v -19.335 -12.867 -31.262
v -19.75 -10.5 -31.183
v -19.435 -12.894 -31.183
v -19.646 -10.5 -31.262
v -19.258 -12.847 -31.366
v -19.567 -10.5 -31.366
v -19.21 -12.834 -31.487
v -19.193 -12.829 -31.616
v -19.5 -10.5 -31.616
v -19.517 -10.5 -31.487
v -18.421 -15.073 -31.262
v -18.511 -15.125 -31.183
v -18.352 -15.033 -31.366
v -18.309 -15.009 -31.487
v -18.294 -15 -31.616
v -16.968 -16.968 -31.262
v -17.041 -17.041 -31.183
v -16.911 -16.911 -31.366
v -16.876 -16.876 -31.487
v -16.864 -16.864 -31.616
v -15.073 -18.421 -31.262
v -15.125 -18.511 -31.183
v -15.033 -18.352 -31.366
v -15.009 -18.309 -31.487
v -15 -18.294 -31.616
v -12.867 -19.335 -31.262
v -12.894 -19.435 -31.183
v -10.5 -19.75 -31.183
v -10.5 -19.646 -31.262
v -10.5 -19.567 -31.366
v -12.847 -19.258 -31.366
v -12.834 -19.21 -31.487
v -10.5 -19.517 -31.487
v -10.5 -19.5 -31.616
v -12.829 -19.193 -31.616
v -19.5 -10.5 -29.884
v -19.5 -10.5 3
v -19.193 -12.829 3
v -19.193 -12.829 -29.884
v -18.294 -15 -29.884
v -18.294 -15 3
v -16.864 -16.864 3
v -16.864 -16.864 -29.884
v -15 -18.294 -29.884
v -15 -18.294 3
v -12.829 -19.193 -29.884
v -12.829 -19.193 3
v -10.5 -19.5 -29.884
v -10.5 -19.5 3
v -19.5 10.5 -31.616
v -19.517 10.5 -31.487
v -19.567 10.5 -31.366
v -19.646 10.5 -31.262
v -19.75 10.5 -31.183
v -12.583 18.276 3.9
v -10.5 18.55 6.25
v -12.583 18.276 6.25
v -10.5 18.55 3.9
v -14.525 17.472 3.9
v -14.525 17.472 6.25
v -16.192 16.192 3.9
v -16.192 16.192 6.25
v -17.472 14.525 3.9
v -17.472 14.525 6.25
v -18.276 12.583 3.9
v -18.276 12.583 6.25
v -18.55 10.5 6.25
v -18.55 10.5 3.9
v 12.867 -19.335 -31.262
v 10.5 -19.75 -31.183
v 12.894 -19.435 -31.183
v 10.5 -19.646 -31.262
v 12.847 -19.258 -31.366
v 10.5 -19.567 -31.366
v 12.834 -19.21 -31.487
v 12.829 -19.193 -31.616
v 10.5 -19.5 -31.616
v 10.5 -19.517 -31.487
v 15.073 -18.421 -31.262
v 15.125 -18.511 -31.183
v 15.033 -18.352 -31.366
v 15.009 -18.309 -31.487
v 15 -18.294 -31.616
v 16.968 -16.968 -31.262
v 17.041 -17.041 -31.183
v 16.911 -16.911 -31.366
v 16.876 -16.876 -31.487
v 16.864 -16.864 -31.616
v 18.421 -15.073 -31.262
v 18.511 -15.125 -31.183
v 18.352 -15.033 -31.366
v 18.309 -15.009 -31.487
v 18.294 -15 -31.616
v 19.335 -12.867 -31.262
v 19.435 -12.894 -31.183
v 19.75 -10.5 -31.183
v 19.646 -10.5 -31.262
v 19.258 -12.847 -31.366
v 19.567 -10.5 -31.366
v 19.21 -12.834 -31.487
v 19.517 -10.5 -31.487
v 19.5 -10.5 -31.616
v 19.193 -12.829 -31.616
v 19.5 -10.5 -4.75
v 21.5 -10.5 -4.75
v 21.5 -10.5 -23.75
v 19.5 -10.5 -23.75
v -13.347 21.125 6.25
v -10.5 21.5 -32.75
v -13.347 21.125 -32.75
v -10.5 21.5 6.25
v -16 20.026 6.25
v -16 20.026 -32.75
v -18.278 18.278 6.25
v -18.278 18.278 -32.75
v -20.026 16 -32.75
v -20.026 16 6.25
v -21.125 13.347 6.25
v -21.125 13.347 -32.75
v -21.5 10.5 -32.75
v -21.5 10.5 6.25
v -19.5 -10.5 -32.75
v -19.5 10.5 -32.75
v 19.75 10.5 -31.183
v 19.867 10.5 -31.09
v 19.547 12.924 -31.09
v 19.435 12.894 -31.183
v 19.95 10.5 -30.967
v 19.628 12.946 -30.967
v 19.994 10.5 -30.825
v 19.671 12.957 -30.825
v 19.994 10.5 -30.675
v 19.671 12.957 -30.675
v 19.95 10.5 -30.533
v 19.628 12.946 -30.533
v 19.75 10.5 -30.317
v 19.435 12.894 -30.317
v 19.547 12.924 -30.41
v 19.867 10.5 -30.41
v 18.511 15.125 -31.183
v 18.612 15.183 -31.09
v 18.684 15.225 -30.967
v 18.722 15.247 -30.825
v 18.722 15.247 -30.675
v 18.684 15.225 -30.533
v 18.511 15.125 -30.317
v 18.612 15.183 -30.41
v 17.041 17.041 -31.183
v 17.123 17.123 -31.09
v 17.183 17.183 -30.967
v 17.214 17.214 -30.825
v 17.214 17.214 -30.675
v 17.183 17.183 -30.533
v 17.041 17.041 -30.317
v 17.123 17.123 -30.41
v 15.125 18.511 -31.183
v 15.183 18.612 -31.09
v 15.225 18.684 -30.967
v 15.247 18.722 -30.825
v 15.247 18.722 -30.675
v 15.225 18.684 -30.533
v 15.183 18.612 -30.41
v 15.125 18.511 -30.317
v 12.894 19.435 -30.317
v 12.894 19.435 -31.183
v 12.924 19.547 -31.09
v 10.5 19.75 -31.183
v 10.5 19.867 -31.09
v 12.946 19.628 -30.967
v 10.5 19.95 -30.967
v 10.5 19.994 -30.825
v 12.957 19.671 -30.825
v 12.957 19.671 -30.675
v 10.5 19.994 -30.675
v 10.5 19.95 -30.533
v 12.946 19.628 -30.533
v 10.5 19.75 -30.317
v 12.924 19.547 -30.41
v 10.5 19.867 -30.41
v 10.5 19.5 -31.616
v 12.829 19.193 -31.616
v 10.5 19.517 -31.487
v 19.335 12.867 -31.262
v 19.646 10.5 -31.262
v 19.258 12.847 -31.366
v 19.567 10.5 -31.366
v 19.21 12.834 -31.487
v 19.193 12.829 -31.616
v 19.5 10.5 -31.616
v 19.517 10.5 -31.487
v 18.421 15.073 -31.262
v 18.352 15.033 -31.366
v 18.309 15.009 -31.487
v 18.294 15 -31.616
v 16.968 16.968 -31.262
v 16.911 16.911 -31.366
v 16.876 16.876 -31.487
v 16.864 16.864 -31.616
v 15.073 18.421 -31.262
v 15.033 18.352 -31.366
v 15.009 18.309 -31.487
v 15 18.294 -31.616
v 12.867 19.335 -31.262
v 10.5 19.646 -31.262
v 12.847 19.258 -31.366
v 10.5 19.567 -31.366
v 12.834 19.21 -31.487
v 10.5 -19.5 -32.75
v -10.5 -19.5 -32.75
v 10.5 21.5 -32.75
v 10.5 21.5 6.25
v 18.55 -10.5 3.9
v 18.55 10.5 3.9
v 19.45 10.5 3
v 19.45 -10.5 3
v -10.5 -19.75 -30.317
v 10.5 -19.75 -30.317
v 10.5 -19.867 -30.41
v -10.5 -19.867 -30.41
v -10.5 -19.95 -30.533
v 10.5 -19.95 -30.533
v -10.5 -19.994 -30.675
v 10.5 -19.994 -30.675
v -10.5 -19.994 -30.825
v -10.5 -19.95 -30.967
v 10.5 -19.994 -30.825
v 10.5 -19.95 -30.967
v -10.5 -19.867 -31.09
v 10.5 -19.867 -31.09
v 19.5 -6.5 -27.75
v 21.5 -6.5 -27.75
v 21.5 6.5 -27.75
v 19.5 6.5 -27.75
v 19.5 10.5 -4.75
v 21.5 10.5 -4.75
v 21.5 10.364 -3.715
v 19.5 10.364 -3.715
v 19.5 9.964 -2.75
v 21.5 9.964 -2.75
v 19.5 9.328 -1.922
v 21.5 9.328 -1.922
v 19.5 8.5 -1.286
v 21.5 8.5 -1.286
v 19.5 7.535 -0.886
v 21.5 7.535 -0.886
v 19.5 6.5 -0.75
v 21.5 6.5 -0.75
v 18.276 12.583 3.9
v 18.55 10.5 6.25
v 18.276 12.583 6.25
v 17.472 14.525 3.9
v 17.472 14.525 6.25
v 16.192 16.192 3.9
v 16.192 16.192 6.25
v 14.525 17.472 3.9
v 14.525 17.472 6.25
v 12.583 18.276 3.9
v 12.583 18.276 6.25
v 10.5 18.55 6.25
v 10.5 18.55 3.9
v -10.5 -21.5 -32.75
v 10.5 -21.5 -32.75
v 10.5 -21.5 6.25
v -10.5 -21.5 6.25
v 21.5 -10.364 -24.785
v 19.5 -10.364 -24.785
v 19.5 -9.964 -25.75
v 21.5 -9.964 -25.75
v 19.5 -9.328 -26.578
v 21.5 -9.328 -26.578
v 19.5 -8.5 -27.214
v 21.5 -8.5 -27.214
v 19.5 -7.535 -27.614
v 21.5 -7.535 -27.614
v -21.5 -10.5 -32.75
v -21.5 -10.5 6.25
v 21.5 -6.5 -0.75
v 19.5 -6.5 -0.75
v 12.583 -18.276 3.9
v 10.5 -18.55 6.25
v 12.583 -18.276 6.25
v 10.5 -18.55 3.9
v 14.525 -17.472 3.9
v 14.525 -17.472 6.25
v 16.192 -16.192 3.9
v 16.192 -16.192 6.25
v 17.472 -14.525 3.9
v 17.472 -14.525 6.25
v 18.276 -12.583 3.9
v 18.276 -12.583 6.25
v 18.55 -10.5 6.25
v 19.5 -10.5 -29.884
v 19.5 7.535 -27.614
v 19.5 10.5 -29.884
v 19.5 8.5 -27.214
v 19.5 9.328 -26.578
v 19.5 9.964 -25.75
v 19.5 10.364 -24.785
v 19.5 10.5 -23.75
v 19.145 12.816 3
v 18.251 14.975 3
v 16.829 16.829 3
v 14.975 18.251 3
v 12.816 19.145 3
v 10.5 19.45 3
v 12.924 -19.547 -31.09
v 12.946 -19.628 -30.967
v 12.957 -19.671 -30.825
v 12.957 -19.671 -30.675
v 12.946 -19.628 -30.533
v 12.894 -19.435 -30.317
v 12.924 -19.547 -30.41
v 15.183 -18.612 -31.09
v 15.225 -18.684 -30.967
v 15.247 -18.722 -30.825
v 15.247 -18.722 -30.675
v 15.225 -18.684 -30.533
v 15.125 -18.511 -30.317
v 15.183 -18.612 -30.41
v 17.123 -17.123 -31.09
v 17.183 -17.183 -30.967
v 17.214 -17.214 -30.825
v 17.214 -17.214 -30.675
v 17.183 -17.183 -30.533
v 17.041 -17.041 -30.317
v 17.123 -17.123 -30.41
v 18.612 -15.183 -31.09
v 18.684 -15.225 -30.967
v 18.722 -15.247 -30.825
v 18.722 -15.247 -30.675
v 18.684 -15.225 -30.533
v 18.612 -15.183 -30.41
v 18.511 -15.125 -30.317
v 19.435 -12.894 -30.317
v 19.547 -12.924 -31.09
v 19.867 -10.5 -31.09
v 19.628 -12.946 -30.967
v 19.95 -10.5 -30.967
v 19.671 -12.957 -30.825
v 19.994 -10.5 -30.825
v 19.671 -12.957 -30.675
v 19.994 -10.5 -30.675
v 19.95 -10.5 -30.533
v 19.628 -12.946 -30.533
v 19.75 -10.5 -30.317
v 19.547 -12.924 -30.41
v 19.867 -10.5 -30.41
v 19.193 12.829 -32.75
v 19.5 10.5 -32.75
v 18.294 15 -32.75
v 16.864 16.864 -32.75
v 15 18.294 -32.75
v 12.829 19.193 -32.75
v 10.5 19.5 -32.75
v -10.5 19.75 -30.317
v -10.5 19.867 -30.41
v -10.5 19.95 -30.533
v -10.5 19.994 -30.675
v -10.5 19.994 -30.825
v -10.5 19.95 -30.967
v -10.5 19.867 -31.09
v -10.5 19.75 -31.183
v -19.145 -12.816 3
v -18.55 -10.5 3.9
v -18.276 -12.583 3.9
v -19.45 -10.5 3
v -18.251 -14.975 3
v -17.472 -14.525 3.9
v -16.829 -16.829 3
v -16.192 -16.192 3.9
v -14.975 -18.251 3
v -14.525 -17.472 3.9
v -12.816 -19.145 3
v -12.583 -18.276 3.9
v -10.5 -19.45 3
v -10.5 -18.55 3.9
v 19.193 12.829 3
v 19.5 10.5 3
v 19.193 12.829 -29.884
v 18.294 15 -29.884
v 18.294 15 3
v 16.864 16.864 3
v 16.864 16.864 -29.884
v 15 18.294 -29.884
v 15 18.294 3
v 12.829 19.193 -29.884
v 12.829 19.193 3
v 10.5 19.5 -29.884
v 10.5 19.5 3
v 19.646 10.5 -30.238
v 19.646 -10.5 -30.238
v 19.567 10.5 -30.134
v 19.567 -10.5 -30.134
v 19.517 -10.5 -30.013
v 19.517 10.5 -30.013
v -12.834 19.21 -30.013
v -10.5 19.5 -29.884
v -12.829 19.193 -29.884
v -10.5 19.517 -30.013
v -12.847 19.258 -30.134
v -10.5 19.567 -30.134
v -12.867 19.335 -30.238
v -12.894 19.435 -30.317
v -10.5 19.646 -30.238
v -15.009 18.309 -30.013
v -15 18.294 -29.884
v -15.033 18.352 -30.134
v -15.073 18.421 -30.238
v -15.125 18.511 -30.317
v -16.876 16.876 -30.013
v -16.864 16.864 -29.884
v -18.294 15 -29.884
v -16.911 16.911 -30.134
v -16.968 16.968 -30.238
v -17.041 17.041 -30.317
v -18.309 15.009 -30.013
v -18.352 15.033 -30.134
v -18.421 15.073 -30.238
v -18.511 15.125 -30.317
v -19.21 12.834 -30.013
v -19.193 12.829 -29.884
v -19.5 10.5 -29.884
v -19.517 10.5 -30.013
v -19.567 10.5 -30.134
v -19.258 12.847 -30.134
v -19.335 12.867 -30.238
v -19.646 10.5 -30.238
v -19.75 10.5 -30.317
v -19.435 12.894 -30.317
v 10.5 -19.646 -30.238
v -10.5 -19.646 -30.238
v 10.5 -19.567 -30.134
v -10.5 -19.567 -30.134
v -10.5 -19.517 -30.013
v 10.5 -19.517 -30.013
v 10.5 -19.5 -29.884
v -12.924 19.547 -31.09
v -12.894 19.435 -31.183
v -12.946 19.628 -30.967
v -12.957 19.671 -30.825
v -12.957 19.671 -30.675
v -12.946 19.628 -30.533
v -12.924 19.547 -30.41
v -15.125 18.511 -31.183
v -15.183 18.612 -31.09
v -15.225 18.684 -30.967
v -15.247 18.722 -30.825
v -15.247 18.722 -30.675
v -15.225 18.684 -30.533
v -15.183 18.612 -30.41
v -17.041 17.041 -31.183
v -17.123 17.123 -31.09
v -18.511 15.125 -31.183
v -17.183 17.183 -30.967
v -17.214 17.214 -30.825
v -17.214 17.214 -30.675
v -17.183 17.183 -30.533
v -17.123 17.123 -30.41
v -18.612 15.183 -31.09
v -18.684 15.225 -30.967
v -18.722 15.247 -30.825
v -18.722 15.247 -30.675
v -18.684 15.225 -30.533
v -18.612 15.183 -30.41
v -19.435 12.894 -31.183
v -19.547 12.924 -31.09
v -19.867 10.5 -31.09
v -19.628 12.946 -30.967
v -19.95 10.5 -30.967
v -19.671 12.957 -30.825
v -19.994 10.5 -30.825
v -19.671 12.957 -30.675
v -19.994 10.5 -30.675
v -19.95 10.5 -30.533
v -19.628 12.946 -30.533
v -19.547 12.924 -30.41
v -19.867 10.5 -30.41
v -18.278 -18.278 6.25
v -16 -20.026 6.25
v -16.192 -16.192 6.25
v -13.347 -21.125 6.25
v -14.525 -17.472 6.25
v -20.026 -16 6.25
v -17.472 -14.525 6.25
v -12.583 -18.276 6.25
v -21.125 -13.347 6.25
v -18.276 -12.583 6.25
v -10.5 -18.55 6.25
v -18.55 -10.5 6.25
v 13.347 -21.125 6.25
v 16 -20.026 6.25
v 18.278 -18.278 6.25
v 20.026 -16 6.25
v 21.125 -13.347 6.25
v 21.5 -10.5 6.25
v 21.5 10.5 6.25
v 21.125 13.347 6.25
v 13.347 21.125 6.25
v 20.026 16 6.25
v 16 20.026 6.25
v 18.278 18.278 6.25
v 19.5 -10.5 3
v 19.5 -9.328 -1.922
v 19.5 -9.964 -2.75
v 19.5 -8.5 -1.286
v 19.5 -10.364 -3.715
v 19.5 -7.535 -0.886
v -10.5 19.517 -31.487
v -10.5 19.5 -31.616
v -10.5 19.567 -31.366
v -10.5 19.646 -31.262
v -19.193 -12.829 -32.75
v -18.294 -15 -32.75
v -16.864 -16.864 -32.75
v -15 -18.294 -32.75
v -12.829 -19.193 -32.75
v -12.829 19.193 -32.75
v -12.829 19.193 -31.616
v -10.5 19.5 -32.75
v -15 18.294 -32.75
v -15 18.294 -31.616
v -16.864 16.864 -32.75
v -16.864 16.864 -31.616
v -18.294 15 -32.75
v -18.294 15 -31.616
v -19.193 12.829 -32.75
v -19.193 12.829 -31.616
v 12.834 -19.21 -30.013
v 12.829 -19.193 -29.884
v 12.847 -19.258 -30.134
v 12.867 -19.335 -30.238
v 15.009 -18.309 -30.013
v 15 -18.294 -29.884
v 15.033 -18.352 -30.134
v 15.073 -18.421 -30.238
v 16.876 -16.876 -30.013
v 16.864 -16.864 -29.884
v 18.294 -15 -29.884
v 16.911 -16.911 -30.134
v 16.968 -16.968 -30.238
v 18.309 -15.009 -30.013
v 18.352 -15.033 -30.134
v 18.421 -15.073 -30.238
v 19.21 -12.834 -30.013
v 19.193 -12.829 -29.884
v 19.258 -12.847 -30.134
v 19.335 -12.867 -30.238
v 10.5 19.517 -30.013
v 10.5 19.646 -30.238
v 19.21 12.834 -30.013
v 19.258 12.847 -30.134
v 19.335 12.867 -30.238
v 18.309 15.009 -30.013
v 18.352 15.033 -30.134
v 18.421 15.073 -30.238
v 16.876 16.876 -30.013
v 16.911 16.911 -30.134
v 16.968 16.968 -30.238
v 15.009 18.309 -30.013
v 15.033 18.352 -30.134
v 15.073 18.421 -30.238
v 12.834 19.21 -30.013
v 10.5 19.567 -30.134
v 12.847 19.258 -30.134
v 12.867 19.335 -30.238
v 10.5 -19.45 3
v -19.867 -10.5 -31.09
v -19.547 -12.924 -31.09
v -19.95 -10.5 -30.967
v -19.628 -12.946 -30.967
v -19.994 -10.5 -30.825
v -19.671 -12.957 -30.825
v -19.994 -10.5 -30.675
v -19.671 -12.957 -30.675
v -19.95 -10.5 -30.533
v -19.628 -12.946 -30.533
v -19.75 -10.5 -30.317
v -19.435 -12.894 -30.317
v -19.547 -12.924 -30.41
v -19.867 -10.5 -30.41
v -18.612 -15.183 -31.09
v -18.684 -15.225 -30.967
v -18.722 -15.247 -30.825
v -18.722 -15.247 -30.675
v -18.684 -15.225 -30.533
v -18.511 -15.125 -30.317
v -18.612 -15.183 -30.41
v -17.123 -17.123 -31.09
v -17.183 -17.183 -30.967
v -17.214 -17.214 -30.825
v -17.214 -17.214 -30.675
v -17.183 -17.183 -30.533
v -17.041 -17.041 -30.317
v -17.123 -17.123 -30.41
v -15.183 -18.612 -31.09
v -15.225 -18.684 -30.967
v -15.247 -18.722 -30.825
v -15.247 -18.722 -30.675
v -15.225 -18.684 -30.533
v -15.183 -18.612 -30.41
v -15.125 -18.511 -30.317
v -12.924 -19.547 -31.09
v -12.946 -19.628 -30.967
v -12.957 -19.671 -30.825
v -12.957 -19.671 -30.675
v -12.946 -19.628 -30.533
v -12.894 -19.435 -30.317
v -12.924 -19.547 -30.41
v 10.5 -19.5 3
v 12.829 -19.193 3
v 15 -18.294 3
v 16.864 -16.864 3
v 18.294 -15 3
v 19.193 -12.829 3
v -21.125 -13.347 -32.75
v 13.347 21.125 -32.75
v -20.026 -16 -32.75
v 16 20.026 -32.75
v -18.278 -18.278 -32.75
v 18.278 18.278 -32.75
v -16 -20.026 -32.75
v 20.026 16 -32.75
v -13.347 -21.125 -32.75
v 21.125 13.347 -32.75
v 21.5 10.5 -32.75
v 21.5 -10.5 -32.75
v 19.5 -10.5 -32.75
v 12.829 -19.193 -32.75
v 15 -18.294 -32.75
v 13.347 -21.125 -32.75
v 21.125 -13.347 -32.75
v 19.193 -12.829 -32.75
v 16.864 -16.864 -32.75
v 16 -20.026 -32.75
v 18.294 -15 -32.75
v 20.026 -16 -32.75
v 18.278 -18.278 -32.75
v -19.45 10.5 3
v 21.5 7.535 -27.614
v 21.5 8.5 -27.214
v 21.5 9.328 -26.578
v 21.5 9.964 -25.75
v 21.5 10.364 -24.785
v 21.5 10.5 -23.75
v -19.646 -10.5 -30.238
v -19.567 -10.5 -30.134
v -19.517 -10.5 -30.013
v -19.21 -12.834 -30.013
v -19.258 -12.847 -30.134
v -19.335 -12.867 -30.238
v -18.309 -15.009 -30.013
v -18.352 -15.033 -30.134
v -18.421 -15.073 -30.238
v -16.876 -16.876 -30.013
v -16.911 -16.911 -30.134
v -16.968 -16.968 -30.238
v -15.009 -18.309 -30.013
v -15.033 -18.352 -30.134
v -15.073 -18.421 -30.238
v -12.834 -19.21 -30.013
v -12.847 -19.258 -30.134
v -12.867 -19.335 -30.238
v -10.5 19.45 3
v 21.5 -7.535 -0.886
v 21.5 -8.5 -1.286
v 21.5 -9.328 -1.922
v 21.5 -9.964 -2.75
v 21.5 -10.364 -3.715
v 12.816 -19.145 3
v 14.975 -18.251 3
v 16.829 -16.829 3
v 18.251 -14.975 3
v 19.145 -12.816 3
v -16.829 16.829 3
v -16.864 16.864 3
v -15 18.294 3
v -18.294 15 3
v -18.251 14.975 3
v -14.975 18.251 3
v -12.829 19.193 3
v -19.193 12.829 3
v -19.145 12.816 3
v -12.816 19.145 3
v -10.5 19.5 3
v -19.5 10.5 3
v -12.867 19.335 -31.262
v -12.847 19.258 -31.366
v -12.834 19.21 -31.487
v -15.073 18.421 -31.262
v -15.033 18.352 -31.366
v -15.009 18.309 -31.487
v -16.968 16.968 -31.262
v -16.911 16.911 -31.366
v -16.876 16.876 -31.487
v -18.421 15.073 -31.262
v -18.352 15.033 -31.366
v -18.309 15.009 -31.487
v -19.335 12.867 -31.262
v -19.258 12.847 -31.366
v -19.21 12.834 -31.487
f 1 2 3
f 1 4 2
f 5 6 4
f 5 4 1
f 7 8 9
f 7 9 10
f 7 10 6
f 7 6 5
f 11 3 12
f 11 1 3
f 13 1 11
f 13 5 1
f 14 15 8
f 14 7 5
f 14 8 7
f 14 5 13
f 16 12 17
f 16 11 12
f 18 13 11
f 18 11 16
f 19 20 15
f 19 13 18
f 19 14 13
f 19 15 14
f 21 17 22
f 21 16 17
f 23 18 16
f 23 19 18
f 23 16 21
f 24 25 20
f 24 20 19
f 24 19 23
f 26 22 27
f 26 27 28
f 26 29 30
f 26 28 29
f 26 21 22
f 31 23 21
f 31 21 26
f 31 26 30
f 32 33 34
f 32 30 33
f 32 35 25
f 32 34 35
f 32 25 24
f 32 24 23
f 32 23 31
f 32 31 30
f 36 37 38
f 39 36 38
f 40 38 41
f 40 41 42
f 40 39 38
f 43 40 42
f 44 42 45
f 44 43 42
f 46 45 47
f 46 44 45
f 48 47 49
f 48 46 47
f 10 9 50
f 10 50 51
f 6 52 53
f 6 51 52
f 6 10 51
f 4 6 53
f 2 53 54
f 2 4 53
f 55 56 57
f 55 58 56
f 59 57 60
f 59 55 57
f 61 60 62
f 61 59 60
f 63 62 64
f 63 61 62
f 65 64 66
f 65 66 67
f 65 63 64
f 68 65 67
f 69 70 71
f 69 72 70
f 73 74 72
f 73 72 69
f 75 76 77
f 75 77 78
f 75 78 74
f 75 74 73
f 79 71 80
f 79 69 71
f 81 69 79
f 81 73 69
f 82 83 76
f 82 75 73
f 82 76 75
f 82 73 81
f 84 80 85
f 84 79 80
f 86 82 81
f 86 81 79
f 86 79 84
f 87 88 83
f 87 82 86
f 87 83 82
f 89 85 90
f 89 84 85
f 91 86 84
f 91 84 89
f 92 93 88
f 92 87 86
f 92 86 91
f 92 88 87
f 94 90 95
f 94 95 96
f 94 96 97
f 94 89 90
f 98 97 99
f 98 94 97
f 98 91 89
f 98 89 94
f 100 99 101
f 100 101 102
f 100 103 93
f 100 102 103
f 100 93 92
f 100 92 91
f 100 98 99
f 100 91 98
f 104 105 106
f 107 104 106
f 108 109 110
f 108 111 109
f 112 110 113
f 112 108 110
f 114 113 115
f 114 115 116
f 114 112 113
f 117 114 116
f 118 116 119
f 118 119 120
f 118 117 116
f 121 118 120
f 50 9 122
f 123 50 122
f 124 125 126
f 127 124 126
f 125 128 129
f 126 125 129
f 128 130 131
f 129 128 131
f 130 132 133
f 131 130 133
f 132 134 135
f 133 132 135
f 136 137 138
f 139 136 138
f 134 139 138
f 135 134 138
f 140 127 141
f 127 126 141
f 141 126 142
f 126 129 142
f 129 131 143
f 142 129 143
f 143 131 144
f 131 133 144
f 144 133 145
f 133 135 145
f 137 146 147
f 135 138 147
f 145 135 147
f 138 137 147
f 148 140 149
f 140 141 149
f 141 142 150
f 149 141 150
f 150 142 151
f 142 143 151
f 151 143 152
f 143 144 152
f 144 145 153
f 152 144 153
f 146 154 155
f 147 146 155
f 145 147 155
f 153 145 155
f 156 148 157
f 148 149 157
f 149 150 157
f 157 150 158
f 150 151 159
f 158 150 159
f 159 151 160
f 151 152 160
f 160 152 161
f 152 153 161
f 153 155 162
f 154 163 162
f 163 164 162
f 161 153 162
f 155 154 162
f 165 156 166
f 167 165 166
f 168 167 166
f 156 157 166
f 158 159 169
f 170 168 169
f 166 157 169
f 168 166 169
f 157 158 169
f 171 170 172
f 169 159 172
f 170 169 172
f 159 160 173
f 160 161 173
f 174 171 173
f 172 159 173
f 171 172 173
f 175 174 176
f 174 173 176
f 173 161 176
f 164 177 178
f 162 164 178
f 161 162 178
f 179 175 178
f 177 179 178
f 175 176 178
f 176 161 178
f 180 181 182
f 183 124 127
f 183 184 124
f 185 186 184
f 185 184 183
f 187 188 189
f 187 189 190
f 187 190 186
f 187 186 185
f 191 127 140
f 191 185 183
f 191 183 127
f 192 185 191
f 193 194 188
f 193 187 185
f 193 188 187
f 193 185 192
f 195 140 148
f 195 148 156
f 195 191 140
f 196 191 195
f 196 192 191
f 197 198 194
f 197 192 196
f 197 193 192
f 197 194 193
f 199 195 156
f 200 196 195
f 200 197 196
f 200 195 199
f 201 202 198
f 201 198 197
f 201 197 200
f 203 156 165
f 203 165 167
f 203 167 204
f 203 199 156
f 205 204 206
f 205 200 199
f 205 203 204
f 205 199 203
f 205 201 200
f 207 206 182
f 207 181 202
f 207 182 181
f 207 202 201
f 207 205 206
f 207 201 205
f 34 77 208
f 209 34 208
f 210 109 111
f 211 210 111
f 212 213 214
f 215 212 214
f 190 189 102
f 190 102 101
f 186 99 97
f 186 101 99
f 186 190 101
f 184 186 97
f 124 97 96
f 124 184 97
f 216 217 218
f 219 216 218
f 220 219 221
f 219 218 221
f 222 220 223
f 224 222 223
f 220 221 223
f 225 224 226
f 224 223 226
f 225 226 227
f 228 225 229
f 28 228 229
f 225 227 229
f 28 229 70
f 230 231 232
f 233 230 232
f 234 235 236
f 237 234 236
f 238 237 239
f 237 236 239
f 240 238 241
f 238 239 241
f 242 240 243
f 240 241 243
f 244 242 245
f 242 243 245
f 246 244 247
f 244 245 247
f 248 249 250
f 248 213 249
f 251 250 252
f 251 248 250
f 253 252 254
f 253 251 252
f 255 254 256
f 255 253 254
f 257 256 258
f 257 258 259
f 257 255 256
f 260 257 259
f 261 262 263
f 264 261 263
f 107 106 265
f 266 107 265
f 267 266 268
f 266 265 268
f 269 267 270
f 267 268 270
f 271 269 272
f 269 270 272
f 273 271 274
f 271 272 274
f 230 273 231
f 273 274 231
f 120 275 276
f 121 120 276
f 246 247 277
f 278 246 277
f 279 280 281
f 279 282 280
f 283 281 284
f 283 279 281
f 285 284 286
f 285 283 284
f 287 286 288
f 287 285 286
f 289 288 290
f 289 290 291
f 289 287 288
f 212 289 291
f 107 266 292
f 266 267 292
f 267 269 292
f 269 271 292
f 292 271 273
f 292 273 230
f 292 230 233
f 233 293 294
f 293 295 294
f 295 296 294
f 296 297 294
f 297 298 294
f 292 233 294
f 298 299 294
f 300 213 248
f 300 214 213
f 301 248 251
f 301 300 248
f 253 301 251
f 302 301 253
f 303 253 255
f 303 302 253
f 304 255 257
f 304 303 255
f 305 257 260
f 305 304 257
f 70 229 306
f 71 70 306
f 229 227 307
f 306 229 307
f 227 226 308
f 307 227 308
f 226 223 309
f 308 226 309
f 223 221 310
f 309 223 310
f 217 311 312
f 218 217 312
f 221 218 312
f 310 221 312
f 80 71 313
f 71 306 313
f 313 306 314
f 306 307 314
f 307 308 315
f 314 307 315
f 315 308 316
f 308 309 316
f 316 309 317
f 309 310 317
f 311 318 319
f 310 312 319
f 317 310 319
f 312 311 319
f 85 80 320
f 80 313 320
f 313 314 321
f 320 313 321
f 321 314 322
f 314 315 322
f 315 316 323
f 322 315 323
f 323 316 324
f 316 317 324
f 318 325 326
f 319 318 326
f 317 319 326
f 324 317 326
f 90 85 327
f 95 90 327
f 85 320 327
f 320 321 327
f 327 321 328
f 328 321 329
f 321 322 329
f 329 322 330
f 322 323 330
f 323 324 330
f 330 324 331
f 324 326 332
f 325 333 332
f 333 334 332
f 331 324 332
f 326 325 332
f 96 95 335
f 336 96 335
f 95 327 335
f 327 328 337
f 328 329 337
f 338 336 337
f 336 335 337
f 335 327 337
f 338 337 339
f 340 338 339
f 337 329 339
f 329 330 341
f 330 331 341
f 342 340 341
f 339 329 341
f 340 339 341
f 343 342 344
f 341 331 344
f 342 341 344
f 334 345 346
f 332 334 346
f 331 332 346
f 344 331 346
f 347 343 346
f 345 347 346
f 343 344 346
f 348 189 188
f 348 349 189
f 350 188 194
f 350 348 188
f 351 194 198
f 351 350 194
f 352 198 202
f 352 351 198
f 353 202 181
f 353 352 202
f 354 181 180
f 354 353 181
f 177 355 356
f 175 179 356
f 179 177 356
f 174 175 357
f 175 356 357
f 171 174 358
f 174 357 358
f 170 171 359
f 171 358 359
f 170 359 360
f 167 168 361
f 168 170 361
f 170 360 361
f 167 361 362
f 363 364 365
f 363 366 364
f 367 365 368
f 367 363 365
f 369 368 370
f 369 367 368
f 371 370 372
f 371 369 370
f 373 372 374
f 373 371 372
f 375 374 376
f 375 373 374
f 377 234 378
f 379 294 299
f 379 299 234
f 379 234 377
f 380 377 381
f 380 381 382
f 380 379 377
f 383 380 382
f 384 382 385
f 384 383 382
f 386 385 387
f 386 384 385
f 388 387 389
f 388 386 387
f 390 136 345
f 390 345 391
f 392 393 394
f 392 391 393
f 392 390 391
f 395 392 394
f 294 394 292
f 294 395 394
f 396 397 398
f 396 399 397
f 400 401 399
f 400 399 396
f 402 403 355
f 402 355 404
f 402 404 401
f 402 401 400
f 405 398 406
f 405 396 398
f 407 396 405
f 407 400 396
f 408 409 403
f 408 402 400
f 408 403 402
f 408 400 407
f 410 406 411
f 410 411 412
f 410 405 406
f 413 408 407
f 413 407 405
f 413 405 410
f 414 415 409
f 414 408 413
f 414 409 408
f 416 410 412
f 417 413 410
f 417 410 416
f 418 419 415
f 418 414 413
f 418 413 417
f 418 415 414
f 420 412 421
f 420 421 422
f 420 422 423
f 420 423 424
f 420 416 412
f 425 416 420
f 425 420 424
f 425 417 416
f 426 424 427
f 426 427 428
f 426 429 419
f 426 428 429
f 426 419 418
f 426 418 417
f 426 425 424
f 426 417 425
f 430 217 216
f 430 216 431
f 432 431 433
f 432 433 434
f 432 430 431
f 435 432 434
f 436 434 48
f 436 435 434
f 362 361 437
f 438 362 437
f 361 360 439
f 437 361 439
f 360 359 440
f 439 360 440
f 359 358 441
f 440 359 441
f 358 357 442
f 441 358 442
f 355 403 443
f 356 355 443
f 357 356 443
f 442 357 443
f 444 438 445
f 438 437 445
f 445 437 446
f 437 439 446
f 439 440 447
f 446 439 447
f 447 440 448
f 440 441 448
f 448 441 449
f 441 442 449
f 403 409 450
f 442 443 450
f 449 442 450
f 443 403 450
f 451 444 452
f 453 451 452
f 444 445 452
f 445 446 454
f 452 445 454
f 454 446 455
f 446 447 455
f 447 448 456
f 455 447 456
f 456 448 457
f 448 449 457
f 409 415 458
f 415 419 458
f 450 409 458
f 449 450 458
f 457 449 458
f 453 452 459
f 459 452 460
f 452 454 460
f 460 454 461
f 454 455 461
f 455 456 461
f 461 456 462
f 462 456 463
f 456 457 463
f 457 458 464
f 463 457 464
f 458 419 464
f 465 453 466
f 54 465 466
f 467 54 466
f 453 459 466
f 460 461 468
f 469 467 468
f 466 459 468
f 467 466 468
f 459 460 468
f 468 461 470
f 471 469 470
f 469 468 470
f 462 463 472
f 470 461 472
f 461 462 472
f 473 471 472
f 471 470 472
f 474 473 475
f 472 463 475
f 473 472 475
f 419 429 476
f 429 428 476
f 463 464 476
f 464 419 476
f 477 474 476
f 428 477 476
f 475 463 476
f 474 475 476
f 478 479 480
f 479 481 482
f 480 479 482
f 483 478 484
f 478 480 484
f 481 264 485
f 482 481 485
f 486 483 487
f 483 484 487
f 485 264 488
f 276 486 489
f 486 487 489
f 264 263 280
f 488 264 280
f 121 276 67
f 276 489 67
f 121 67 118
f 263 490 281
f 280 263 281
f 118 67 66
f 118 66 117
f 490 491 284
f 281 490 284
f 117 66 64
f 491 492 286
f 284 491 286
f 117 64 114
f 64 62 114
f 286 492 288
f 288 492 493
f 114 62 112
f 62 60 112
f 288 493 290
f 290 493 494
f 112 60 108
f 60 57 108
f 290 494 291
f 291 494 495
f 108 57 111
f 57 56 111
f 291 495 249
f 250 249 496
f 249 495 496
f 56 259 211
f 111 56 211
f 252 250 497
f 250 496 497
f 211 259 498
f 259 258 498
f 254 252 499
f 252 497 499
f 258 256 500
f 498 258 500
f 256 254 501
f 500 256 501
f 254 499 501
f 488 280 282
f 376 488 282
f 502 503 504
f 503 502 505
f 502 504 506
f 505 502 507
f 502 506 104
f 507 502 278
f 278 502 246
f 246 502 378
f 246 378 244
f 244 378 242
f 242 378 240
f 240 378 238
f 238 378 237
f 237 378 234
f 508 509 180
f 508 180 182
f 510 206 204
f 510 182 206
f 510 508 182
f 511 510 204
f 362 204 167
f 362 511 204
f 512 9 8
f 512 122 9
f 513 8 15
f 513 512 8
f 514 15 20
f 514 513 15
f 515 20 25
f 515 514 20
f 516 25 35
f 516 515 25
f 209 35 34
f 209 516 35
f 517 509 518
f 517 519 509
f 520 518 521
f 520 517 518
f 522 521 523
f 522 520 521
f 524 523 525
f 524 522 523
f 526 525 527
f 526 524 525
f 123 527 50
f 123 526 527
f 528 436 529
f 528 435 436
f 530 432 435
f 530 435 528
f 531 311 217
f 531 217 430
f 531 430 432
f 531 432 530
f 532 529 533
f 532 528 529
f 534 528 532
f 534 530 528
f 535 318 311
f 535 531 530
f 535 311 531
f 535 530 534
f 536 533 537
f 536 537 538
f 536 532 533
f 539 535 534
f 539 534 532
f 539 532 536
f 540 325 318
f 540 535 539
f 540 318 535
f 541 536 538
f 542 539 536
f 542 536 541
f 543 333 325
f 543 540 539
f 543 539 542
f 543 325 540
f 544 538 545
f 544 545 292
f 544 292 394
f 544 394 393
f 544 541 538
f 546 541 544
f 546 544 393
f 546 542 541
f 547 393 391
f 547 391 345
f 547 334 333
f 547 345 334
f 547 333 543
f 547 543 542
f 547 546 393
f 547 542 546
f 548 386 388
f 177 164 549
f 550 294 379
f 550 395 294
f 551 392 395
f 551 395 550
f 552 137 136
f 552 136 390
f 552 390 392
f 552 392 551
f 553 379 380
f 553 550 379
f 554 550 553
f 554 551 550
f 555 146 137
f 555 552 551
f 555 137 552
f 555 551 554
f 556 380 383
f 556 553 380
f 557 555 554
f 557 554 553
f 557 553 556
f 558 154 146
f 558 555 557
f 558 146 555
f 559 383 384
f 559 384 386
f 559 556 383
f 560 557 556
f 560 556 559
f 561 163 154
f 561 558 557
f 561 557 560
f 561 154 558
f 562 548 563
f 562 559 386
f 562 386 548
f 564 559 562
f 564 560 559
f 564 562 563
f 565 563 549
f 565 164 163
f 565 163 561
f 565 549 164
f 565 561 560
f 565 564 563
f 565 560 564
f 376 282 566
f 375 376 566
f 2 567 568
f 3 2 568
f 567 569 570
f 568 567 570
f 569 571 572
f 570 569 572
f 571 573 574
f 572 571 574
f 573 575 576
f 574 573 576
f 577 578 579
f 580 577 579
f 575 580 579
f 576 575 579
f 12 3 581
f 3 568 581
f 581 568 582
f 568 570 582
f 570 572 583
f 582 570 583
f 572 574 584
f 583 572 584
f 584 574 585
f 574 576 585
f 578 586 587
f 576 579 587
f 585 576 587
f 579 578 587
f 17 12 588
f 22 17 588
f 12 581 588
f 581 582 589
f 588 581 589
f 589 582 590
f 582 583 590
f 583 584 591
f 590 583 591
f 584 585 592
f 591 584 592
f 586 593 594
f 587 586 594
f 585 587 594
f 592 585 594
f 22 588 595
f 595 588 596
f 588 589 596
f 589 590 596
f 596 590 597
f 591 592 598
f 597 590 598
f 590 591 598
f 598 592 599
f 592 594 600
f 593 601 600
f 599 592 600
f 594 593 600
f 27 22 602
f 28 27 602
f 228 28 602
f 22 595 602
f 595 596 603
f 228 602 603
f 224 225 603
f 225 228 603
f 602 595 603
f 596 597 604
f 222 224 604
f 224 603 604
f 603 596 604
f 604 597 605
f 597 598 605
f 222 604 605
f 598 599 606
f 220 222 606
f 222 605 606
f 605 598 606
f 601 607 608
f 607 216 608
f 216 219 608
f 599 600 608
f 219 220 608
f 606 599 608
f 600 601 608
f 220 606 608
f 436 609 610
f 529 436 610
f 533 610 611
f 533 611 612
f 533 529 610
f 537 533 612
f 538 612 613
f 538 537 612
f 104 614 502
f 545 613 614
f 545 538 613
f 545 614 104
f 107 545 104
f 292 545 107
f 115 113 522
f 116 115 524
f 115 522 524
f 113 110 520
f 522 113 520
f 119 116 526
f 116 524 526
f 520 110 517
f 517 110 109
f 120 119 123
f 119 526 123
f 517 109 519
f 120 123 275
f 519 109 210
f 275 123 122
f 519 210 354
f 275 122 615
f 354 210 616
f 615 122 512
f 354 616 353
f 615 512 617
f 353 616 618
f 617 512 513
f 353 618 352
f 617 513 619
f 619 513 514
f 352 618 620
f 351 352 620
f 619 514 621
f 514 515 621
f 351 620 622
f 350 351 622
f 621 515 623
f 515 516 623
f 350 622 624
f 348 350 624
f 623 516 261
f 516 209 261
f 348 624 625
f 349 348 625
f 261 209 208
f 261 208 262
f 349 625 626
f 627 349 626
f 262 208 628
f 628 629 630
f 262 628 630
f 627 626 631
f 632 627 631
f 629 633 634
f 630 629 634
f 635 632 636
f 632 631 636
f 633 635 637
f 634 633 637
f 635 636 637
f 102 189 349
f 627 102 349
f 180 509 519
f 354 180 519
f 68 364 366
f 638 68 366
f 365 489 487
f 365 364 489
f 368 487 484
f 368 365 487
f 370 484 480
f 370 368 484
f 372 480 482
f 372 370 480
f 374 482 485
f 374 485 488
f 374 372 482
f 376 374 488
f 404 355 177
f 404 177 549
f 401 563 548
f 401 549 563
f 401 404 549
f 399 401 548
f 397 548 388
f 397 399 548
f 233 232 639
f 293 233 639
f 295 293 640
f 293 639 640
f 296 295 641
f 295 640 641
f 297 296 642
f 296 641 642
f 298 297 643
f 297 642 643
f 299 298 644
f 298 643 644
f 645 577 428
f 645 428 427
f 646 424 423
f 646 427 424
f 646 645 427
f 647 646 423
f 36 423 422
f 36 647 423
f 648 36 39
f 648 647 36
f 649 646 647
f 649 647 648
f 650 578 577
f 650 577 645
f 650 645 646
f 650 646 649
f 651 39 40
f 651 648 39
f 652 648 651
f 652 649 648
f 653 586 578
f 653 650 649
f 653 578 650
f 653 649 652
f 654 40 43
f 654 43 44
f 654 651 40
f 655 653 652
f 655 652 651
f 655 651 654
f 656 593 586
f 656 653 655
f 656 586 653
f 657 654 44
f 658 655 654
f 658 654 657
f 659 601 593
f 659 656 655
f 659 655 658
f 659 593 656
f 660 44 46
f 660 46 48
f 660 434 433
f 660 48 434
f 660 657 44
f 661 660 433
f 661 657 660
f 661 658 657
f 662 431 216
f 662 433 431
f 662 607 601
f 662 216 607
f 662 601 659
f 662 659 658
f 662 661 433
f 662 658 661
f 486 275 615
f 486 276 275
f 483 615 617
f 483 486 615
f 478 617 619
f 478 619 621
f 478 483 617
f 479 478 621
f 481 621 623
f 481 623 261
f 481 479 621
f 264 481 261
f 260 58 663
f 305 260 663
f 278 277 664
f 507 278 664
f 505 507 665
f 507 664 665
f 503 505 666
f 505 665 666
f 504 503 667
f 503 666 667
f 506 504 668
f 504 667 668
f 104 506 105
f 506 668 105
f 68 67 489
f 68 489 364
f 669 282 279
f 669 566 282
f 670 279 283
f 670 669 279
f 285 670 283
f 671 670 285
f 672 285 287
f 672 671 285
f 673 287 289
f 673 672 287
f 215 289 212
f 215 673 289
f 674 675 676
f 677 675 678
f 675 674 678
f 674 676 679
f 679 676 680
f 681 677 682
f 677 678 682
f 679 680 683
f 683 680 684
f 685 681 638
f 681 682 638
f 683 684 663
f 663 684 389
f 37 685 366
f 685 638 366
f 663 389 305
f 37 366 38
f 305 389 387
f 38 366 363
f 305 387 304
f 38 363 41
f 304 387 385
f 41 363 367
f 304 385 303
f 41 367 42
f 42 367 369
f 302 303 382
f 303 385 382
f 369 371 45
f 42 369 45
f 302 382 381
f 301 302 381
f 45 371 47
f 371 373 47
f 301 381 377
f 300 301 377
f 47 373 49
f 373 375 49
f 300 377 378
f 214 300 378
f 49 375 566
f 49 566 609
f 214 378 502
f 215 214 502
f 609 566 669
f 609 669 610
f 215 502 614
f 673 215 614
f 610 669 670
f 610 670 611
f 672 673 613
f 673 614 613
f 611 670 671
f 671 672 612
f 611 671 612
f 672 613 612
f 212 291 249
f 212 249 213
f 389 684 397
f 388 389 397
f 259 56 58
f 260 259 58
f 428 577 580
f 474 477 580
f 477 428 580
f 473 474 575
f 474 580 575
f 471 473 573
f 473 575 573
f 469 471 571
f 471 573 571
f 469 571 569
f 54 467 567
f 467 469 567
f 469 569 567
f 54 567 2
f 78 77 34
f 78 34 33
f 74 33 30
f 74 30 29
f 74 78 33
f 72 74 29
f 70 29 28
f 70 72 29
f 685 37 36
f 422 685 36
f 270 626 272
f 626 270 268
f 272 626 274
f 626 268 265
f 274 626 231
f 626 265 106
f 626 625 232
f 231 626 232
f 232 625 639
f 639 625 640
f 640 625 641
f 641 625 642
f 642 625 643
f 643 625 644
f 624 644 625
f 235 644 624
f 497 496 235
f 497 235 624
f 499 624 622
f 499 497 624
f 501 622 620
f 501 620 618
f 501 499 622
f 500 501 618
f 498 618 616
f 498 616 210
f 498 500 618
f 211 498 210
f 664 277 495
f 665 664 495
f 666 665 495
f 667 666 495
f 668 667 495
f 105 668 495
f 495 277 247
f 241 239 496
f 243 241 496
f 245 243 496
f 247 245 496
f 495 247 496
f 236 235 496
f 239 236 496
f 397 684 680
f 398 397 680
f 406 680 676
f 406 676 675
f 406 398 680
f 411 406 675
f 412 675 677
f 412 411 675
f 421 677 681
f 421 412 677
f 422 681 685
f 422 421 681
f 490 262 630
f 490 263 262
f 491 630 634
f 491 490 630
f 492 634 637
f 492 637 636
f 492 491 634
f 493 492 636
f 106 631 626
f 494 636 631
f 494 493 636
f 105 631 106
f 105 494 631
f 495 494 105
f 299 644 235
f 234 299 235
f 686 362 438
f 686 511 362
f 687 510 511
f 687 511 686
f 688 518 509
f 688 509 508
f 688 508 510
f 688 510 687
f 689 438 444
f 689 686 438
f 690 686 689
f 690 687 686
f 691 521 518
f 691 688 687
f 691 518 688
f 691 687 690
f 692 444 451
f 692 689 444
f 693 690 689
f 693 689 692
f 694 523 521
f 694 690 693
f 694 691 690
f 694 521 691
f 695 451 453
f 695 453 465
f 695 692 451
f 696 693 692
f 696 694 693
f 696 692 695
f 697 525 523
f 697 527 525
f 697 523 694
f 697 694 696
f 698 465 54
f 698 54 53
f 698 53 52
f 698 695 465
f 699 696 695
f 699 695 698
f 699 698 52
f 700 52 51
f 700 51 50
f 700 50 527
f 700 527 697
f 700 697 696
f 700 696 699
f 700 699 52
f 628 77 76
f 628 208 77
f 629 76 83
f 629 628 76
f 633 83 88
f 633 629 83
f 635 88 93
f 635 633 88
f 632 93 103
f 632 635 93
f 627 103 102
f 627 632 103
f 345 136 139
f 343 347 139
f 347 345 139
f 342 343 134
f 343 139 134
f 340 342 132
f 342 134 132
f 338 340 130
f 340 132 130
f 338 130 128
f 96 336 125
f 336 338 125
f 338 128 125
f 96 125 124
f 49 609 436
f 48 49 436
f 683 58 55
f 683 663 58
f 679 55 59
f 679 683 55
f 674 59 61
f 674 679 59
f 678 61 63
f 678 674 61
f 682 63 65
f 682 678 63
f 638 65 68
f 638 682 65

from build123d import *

# Parameters (mm, degrees)
POWER_BUTTON_HOLE_DEPTH = 2


with BuildPart() as part:
    # Case 2: sweep along a path in Sketch1
    with BuildLine(Plane.XY) as case_2_path:
        Line((-10.5, -19.25), (10.5, -19.25))
        ThreePointArc((10.5, -19.25), (16.687184335, -16.687184335), (19.25, -10.5))
        Line((19.25, -10.5), (19.25, 10.5))
        ThreePointArc((19.25, 10.5), (16.687184335, 16.687184335), (10.5, 19.25))
        Line((10.5, 19.25), (-10.5, 19.25))
        ThreePointArc((-10.5, 19.25), (-16.687184335, 16.687184335), (-19.25, 10.5))
        Line((-19.25, 10.5), (-19.25, -10.5))
        ThreePointArc((-19.25, -10.5), (-16.687184335, -16.687184335), (-10.5, -19.25))
    # Sketch4 → Case 2 (sweep)
    with BuildSketch(Plane(origin=(0, 0, 0), x_dir=(1, 0, 0), z_dir=(0, 1, 0))):
        with BuildLine():
            Line((-19.5, 0), (-19.5, -3))
            Line((-19.5, -3), (-19.45, -3))
            Line((-19.45, -3), (-18.55, -3.9))
            Line((-18.55, -3.9), (-18.55, -6.25))
            Line((-18.55, -6.25), (-21.5, -6.25))
            Line((-21.5, -6.25), (-21.5, 32.75))
            Line((-21.5, 32.75), (-19.5, 32.75))
            Line((-19.5, 32.75), (-19.5, 31.616025404))
            ThreePointArc((-19.5, 31.616025404), (-19.566987298, 31.366025404), (-19.75, 31.183012702))
            ThreePointArc((-19.75, 31.183012702), (-20, 30.75), (-19.75, 30.316987298))
            ThreePointArc((-19.75, 30.316987298), (-19.566987298, 30.133974596), (-19.5, 29.883974596))
            Line((-19.5, 29.883974596), (-19.5, 0))
        make_face()
    sweep(path=case_2_path.line)

    # Sketch6 → Power Button Hole (cut)
    with BuildSketch(Plane(origin=(21.5, 0, 0), x_dir=(0, 0, -1), z_dir=(1, 0, 0))):
        with BuildLine():
            Line((23.75, 10.5), (4.75, 10.5))
            ThreePointArc((4.75, 10.5), (1.921572875, 9.328427125), (0.75, 6.5))
            Line((0.75, 6.5), (0.75, -6.5))
            ThreePointArc((0.75, -6.5), (1.921572875, -9.328427125), (4.75, -10.5))
            Line((4.75, -10.5), (23.75, -10.5))
            ThreePointArc((23.75, -10.5), (26.578427125, -9.328427125), (27.75, -6.5))
            Line((27.75, -6.5), (27.75, 6.5))
            ThreePointArc((27.75, 6.5), (26.578427125, 9.328427125), (23.75, 10.5))
        make_face()
    extrude(amount=-POWER_BUTTON_HOLE_DEPTH, mode=Mode.SUBTRACT)


solid = part.part
